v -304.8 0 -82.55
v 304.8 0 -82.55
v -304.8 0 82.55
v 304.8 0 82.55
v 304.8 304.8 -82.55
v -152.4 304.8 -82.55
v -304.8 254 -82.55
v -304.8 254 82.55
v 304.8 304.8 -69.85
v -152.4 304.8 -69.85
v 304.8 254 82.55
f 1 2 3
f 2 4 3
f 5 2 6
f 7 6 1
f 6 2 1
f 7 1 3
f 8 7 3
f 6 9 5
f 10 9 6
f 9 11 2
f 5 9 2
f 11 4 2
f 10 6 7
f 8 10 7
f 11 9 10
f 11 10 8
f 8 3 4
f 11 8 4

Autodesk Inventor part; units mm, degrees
ref_plane "YZ Plane" through (0, 0, 0) normal (1, 0, 0) x (0, 1, 0)
ref_plane "XZ Plane" through (0, 0, 0) normal (0, 1, 0) x (-1, 0, 0)
ref_plane "XY Plane" through (0, 0, 0) normal (0, 0, 1) x (1, 0, 0)
sketch "Sketch1" plane through (0, 0, 0) normal (0, 1, 0) x (-1, 0, 0)
  line L0 (-304.8, -82.55) -> (304.8, -82.55)
  line L1 (304.8, -82.55) -> (304.8, 82.55)
  line L2 (304.8, 82.55) -> (-304.8, 82.55)
  line L3 (-304.8, 82.55) -> (-304.8, -82.55)
  line L4 (-304.8, -82.55) -> (304.8, 82.55) construction
  line L5 (304.8, -82.55) -> (-304.8, 82.55) construction
  point P0 (0, 0)
  dimension "d0" = 609.6
  dimension "d1" = 165.1
extrude "Extrusion1" add sketch "Sketch1" along normal blind 304.8
sketch "Sketch2" plane through (304.8, 0, 82.55) normal (1, 0, 0) x (0, 0, -1)
  line L0 (165.1, 304.8) -> (0, 304.8) projected
  line L1 (0, 0) -> (0, 304.8) projected
  line L2 (152.4, 304.8) -> (0, 254)
  line L3 (0, 304.8) -> (0, 254)
  line L4 (0, 304.8) -> (152.4, 304.8)
  point P0 (82.55, 0)
  dimension "d4" = 50.8
  dimension "d5" = 152.4
extrude "Extrusion2" cut sketch "Sketch2" against normal through all
sketch "Sketch3" plane through (304.8, 0, -82.55) normal (0, 0, -1) x (-1, 0, 0)
  line L0 (0, 304.8) -> (609.6, 304.8) projected
  line L1 (609.6, 0) -> (609.6, 304.8) projected
  line L2 (457.2, 304.8) -> (609.6, 254)
  line L3 (609.6, 304.8) -> (609.6, 254)
  line L4 (609.6, 304.8) -> (457.2, 304.8)
  point P0 (304.8, 0)
  dimension "d8" = 152.4
  dimension "d9" = 50.8
extrude "Extrusion3" cut sketch "Sketch3" against normal through all
properties part number "Straight_C21" material "Limestone"
